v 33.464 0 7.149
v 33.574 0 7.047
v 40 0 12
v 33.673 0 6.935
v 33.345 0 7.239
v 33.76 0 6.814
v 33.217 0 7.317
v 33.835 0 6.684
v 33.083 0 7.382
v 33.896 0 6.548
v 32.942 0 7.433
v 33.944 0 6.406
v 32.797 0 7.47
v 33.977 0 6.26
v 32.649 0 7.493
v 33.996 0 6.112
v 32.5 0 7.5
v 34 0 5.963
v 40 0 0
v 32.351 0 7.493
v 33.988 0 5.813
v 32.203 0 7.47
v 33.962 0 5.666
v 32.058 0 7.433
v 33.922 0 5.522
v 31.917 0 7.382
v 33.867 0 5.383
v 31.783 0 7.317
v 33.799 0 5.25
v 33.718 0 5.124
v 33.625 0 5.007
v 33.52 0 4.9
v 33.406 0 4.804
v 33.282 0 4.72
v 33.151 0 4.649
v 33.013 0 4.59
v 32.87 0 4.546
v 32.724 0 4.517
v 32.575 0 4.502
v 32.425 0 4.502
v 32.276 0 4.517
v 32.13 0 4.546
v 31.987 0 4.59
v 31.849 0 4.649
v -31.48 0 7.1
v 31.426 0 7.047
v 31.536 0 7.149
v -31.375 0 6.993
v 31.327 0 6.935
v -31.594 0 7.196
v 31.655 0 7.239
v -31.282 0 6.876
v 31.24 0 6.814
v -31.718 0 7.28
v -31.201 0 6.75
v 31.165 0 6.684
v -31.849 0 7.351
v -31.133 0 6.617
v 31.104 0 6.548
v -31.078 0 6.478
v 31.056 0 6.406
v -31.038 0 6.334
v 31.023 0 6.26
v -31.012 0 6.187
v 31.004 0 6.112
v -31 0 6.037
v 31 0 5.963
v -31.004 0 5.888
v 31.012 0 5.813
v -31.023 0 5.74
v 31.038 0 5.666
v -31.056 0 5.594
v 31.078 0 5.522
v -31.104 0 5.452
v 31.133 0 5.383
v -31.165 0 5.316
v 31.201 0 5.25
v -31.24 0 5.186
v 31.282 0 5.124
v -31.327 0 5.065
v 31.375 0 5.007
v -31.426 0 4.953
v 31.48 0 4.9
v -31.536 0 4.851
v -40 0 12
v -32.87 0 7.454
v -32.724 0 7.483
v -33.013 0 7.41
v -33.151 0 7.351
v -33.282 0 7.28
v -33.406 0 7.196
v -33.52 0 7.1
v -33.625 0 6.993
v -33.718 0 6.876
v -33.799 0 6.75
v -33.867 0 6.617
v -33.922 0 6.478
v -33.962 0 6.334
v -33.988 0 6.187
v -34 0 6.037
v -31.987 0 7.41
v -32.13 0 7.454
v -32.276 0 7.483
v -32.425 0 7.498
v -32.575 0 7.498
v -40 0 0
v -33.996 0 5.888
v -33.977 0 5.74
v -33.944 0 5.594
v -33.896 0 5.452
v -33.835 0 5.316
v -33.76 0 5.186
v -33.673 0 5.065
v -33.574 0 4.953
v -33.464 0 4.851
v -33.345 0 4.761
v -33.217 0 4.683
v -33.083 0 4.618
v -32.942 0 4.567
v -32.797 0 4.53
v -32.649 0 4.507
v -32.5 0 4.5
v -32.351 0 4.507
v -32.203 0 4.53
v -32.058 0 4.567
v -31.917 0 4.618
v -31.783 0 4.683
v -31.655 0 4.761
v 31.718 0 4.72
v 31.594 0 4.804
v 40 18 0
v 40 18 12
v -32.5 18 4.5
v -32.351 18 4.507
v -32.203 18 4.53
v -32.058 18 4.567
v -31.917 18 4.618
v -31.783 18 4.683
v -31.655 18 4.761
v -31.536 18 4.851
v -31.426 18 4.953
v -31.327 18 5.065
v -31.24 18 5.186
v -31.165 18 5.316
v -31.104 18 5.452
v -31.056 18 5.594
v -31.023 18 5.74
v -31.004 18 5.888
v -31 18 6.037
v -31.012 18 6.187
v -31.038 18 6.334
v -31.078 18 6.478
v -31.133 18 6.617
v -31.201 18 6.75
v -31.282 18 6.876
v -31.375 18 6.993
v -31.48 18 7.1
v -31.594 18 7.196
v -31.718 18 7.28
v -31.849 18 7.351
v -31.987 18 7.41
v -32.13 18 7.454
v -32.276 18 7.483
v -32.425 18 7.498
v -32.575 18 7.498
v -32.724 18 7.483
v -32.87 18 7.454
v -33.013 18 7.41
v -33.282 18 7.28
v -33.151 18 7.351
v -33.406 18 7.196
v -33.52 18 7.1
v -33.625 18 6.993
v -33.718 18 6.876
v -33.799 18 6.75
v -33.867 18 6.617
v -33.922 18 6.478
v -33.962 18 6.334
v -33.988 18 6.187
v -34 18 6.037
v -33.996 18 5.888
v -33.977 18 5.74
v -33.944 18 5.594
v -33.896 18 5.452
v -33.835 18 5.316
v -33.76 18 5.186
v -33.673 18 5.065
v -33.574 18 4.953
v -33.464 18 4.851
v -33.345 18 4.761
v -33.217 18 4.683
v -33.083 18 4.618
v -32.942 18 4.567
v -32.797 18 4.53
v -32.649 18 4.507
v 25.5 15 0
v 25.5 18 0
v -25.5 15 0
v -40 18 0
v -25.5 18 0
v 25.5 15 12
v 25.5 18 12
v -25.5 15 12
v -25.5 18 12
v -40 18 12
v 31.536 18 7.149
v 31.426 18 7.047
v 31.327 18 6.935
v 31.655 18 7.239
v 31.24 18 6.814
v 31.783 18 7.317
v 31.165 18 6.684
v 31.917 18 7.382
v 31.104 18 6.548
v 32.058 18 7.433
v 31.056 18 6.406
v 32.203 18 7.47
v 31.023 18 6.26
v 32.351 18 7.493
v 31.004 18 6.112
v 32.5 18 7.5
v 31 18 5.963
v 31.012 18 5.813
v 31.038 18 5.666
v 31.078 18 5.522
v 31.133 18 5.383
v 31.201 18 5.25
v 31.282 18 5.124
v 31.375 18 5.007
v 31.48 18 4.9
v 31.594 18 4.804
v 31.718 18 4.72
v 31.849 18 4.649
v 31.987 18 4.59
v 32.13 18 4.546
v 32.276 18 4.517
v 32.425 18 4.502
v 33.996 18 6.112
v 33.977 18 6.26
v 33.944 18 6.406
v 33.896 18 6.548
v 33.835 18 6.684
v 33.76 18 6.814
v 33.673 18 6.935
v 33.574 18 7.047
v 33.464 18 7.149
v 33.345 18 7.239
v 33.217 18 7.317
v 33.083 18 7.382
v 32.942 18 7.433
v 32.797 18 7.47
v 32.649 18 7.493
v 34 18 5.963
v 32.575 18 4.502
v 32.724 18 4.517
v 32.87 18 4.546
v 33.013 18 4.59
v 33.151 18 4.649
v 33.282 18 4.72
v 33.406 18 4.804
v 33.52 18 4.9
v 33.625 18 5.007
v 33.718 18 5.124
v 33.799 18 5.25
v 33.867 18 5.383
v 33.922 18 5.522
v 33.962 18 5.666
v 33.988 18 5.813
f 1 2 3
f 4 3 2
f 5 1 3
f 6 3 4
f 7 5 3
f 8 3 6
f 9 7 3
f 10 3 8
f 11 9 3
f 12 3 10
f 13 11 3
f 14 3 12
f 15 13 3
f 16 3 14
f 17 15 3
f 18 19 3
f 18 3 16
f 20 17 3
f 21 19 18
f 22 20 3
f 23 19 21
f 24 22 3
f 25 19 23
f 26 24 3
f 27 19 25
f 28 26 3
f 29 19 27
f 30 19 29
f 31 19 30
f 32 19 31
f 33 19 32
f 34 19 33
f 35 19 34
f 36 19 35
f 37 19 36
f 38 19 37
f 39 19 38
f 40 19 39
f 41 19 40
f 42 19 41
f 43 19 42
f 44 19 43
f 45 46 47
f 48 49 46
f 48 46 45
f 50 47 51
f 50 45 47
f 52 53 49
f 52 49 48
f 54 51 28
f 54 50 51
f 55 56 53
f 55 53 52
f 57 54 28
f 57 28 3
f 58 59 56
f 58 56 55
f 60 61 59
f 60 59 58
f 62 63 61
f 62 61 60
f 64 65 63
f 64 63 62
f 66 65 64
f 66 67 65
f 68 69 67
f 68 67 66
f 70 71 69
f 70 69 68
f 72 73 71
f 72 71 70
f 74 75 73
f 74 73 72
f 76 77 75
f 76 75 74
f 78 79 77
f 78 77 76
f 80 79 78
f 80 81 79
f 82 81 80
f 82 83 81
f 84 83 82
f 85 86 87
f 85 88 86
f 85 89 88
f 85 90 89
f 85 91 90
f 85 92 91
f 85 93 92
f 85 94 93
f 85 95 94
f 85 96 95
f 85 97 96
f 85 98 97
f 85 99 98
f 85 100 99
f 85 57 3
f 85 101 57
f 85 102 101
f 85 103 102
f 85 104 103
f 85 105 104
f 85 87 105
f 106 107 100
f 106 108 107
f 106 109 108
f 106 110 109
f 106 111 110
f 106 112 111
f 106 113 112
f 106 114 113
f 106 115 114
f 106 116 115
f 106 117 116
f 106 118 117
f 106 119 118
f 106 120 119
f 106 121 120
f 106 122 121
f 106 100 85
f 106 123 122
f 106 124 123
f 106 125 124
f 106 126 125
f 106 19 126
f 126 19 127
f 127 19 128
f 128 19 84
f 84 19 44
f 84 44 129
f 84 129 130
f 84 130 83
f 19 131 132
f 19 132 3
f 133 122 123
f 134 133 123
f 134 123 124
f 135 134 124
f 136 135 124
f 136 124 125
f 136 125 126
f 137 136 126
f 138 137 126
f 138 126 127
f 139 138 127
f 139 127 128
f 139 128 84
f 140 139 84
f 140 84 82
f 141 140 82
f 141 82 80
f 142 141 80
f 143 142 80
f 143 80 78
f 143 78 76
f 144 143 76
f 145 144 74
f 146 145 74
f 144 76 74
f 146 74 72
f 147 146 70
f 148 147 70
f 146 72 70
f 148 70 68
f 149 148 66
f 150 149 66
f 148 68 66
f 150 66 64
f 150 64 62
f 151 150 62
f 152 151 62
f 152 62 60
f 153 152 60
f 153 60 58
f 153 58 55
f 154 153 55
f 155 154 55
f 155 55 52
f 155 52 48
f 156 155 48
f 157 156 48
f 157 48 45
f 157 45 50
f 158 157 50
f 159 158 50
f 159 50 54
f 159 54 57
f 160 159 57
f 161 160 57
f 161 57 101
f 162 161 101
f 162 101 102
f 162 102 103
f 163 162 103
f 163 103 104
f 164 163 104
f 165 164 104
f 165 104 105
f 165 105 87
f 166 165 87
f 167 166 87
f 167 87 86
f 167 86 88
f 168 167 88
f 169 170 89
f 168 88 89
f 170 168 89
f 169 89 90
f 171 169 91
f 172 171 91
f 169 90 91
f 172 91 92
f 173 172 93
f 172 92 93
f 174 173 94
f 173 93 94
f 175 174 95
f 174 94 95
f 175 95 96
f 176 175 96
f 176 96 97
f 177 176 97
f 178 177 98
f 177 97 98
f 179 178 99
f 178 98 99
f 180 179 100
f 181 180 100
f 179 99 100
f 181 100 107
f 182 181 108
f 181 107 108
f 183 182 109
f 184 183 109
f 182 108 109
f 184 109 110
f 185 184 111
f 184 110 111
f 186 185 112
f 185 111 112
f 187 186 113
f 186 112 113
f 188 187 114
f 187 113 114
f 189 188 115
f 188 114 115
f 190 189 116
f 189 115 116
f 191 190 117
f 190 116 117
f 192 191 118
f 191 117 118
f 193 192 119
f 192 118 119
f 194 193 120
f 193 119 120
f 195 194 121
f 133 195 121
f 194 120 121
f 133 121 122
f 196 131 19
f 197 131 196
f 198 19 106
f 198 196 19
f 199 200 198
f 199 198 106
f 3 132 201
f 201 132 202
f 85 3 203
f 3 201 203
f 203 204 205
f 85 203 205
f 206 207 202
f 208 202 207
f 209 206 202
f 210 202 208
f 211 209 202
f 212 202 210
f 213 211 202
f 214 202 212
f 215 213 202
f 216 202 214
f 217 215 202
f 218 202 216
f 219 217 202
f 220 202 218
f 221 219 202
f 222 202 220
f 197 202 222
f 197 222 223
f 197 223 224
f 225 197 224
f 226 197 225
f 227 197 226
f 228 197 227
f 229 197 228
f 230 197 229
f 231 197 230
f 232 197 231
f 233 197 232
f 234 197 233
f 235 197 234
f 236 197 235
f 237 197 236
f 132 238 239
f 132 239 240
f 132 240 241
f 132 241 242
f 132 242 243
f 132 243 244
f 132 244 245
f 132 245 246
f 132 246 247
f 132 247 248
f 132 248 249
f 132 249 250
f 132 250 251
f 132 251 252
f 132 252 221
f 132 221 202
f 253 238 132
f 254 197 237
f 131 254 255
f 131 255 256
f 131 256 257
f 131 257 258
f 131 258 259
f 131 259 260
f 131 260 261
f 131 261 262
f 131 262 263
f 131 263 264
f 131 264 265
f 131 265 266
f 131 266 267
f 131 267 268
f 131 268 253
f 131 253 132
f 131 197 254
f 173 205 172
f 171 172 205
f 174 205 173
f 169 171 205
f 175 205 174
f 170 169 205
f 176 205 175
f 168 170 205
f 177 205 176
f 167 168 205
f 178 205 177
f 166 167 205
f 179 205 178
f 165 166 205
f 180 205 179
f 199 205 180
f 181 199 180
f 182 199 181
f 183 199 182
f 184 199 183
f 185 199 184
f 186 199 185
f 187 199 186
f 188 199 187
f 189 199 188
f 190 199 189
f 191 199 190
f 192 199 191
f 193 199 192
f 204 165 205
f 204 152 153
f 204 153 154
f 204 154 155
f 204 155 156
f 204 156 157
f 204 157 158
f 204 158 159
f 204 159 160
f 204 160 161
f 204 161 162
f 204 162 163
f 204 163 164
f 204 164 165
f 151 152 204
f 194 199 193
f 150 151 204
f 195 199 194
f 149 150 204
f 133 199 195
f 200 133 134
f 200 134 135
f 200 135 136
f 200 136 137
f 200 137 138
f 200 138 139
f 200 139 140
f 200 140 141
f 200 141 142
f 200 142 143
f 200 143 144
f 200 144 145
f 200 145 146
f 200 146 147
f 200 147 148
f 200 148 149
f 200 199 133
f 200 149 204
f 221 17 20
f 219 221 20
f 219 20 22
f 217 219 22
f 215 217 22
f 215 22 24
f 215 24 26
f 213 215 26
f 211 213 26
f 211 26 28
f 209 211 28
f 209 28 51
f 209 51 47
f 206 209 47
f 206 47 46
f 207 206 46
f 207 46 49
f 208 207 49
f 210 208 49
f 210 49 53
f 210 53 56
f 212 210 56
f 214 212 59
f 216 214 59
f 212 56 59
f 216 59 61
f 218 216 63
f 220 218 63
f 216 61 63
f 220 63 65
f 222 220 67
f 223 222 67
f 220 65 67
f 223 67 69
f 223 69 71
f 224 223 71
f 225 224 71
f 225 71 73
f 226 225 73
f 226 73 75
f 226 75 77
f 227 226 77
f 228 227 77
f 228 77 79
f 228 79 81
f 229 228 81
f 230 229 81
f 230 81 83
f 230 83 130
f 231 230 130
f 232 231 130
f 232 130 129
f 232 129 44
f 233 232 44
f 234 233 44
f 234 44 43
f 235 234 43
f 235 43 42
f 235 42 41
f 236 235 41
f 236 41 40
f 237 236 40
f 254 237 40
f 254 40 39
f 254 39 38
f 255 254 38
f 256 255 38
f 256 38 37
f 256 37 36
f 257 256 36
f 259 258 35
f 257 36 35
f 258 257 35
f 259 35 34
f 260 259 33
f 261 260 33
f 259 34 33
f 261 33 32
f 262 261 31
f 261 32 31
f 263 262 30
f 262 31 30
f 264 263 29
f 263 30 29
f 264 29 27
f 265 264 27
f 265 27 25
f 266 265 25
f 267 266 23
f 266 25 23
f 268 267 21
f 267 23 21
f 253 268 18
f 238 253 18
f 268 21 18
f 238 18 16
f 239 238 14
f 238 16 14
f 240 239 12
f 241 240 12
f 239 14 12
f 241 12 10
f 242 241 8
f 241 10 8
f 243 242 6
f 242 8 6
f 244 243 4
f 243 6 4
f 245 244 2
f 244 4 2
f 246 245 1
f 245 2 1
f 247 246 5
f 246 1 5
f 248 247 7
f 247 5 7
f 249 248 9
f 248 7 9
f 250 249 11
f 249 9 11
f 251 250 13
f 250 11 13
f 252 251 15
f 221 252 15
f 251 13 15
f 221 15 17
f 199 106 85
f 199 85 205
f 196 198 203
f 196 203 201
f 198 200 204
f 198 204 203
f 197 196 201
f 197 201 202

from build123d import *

# Parameters (mm, degrees)
EXTRUDE_1_DEPTH     = 12
SKETCH_2_R          = 1.5
CUT_EXTRUDE_1_DEPTH = 46.475268004


with BuildPart() as part:
    # 草图1 → 凸台-拉伸1 (new body)
    with BuildSketch(Plane.XY):
        Polygon((40, 0), (-40, 0), (-40, 18), (-25.5, 18), (-25.5, 15), (25.5, 15), (25.5, 18), (40, 18), align=None)
    extrude(amount=EXTRUDE_1_DEPTH)

    # 草图2 → 切除-拉伸1 (cut, through all)
    with BuildSketch(Plane.XZ):
        with Locations(Location((-32.5, 6, 0), (0, 0, 270))):
            Circle(SKETCH_2_R)
        with Locations(Location((32.5, 6, 0), (0, 0, 90))):
            Circle(SKETCH_2_R)
    extrude(amount=-CUT_EXTRUDE_1_DEPTH, mode=Mode.SUBTRACT)


solid = part.part
